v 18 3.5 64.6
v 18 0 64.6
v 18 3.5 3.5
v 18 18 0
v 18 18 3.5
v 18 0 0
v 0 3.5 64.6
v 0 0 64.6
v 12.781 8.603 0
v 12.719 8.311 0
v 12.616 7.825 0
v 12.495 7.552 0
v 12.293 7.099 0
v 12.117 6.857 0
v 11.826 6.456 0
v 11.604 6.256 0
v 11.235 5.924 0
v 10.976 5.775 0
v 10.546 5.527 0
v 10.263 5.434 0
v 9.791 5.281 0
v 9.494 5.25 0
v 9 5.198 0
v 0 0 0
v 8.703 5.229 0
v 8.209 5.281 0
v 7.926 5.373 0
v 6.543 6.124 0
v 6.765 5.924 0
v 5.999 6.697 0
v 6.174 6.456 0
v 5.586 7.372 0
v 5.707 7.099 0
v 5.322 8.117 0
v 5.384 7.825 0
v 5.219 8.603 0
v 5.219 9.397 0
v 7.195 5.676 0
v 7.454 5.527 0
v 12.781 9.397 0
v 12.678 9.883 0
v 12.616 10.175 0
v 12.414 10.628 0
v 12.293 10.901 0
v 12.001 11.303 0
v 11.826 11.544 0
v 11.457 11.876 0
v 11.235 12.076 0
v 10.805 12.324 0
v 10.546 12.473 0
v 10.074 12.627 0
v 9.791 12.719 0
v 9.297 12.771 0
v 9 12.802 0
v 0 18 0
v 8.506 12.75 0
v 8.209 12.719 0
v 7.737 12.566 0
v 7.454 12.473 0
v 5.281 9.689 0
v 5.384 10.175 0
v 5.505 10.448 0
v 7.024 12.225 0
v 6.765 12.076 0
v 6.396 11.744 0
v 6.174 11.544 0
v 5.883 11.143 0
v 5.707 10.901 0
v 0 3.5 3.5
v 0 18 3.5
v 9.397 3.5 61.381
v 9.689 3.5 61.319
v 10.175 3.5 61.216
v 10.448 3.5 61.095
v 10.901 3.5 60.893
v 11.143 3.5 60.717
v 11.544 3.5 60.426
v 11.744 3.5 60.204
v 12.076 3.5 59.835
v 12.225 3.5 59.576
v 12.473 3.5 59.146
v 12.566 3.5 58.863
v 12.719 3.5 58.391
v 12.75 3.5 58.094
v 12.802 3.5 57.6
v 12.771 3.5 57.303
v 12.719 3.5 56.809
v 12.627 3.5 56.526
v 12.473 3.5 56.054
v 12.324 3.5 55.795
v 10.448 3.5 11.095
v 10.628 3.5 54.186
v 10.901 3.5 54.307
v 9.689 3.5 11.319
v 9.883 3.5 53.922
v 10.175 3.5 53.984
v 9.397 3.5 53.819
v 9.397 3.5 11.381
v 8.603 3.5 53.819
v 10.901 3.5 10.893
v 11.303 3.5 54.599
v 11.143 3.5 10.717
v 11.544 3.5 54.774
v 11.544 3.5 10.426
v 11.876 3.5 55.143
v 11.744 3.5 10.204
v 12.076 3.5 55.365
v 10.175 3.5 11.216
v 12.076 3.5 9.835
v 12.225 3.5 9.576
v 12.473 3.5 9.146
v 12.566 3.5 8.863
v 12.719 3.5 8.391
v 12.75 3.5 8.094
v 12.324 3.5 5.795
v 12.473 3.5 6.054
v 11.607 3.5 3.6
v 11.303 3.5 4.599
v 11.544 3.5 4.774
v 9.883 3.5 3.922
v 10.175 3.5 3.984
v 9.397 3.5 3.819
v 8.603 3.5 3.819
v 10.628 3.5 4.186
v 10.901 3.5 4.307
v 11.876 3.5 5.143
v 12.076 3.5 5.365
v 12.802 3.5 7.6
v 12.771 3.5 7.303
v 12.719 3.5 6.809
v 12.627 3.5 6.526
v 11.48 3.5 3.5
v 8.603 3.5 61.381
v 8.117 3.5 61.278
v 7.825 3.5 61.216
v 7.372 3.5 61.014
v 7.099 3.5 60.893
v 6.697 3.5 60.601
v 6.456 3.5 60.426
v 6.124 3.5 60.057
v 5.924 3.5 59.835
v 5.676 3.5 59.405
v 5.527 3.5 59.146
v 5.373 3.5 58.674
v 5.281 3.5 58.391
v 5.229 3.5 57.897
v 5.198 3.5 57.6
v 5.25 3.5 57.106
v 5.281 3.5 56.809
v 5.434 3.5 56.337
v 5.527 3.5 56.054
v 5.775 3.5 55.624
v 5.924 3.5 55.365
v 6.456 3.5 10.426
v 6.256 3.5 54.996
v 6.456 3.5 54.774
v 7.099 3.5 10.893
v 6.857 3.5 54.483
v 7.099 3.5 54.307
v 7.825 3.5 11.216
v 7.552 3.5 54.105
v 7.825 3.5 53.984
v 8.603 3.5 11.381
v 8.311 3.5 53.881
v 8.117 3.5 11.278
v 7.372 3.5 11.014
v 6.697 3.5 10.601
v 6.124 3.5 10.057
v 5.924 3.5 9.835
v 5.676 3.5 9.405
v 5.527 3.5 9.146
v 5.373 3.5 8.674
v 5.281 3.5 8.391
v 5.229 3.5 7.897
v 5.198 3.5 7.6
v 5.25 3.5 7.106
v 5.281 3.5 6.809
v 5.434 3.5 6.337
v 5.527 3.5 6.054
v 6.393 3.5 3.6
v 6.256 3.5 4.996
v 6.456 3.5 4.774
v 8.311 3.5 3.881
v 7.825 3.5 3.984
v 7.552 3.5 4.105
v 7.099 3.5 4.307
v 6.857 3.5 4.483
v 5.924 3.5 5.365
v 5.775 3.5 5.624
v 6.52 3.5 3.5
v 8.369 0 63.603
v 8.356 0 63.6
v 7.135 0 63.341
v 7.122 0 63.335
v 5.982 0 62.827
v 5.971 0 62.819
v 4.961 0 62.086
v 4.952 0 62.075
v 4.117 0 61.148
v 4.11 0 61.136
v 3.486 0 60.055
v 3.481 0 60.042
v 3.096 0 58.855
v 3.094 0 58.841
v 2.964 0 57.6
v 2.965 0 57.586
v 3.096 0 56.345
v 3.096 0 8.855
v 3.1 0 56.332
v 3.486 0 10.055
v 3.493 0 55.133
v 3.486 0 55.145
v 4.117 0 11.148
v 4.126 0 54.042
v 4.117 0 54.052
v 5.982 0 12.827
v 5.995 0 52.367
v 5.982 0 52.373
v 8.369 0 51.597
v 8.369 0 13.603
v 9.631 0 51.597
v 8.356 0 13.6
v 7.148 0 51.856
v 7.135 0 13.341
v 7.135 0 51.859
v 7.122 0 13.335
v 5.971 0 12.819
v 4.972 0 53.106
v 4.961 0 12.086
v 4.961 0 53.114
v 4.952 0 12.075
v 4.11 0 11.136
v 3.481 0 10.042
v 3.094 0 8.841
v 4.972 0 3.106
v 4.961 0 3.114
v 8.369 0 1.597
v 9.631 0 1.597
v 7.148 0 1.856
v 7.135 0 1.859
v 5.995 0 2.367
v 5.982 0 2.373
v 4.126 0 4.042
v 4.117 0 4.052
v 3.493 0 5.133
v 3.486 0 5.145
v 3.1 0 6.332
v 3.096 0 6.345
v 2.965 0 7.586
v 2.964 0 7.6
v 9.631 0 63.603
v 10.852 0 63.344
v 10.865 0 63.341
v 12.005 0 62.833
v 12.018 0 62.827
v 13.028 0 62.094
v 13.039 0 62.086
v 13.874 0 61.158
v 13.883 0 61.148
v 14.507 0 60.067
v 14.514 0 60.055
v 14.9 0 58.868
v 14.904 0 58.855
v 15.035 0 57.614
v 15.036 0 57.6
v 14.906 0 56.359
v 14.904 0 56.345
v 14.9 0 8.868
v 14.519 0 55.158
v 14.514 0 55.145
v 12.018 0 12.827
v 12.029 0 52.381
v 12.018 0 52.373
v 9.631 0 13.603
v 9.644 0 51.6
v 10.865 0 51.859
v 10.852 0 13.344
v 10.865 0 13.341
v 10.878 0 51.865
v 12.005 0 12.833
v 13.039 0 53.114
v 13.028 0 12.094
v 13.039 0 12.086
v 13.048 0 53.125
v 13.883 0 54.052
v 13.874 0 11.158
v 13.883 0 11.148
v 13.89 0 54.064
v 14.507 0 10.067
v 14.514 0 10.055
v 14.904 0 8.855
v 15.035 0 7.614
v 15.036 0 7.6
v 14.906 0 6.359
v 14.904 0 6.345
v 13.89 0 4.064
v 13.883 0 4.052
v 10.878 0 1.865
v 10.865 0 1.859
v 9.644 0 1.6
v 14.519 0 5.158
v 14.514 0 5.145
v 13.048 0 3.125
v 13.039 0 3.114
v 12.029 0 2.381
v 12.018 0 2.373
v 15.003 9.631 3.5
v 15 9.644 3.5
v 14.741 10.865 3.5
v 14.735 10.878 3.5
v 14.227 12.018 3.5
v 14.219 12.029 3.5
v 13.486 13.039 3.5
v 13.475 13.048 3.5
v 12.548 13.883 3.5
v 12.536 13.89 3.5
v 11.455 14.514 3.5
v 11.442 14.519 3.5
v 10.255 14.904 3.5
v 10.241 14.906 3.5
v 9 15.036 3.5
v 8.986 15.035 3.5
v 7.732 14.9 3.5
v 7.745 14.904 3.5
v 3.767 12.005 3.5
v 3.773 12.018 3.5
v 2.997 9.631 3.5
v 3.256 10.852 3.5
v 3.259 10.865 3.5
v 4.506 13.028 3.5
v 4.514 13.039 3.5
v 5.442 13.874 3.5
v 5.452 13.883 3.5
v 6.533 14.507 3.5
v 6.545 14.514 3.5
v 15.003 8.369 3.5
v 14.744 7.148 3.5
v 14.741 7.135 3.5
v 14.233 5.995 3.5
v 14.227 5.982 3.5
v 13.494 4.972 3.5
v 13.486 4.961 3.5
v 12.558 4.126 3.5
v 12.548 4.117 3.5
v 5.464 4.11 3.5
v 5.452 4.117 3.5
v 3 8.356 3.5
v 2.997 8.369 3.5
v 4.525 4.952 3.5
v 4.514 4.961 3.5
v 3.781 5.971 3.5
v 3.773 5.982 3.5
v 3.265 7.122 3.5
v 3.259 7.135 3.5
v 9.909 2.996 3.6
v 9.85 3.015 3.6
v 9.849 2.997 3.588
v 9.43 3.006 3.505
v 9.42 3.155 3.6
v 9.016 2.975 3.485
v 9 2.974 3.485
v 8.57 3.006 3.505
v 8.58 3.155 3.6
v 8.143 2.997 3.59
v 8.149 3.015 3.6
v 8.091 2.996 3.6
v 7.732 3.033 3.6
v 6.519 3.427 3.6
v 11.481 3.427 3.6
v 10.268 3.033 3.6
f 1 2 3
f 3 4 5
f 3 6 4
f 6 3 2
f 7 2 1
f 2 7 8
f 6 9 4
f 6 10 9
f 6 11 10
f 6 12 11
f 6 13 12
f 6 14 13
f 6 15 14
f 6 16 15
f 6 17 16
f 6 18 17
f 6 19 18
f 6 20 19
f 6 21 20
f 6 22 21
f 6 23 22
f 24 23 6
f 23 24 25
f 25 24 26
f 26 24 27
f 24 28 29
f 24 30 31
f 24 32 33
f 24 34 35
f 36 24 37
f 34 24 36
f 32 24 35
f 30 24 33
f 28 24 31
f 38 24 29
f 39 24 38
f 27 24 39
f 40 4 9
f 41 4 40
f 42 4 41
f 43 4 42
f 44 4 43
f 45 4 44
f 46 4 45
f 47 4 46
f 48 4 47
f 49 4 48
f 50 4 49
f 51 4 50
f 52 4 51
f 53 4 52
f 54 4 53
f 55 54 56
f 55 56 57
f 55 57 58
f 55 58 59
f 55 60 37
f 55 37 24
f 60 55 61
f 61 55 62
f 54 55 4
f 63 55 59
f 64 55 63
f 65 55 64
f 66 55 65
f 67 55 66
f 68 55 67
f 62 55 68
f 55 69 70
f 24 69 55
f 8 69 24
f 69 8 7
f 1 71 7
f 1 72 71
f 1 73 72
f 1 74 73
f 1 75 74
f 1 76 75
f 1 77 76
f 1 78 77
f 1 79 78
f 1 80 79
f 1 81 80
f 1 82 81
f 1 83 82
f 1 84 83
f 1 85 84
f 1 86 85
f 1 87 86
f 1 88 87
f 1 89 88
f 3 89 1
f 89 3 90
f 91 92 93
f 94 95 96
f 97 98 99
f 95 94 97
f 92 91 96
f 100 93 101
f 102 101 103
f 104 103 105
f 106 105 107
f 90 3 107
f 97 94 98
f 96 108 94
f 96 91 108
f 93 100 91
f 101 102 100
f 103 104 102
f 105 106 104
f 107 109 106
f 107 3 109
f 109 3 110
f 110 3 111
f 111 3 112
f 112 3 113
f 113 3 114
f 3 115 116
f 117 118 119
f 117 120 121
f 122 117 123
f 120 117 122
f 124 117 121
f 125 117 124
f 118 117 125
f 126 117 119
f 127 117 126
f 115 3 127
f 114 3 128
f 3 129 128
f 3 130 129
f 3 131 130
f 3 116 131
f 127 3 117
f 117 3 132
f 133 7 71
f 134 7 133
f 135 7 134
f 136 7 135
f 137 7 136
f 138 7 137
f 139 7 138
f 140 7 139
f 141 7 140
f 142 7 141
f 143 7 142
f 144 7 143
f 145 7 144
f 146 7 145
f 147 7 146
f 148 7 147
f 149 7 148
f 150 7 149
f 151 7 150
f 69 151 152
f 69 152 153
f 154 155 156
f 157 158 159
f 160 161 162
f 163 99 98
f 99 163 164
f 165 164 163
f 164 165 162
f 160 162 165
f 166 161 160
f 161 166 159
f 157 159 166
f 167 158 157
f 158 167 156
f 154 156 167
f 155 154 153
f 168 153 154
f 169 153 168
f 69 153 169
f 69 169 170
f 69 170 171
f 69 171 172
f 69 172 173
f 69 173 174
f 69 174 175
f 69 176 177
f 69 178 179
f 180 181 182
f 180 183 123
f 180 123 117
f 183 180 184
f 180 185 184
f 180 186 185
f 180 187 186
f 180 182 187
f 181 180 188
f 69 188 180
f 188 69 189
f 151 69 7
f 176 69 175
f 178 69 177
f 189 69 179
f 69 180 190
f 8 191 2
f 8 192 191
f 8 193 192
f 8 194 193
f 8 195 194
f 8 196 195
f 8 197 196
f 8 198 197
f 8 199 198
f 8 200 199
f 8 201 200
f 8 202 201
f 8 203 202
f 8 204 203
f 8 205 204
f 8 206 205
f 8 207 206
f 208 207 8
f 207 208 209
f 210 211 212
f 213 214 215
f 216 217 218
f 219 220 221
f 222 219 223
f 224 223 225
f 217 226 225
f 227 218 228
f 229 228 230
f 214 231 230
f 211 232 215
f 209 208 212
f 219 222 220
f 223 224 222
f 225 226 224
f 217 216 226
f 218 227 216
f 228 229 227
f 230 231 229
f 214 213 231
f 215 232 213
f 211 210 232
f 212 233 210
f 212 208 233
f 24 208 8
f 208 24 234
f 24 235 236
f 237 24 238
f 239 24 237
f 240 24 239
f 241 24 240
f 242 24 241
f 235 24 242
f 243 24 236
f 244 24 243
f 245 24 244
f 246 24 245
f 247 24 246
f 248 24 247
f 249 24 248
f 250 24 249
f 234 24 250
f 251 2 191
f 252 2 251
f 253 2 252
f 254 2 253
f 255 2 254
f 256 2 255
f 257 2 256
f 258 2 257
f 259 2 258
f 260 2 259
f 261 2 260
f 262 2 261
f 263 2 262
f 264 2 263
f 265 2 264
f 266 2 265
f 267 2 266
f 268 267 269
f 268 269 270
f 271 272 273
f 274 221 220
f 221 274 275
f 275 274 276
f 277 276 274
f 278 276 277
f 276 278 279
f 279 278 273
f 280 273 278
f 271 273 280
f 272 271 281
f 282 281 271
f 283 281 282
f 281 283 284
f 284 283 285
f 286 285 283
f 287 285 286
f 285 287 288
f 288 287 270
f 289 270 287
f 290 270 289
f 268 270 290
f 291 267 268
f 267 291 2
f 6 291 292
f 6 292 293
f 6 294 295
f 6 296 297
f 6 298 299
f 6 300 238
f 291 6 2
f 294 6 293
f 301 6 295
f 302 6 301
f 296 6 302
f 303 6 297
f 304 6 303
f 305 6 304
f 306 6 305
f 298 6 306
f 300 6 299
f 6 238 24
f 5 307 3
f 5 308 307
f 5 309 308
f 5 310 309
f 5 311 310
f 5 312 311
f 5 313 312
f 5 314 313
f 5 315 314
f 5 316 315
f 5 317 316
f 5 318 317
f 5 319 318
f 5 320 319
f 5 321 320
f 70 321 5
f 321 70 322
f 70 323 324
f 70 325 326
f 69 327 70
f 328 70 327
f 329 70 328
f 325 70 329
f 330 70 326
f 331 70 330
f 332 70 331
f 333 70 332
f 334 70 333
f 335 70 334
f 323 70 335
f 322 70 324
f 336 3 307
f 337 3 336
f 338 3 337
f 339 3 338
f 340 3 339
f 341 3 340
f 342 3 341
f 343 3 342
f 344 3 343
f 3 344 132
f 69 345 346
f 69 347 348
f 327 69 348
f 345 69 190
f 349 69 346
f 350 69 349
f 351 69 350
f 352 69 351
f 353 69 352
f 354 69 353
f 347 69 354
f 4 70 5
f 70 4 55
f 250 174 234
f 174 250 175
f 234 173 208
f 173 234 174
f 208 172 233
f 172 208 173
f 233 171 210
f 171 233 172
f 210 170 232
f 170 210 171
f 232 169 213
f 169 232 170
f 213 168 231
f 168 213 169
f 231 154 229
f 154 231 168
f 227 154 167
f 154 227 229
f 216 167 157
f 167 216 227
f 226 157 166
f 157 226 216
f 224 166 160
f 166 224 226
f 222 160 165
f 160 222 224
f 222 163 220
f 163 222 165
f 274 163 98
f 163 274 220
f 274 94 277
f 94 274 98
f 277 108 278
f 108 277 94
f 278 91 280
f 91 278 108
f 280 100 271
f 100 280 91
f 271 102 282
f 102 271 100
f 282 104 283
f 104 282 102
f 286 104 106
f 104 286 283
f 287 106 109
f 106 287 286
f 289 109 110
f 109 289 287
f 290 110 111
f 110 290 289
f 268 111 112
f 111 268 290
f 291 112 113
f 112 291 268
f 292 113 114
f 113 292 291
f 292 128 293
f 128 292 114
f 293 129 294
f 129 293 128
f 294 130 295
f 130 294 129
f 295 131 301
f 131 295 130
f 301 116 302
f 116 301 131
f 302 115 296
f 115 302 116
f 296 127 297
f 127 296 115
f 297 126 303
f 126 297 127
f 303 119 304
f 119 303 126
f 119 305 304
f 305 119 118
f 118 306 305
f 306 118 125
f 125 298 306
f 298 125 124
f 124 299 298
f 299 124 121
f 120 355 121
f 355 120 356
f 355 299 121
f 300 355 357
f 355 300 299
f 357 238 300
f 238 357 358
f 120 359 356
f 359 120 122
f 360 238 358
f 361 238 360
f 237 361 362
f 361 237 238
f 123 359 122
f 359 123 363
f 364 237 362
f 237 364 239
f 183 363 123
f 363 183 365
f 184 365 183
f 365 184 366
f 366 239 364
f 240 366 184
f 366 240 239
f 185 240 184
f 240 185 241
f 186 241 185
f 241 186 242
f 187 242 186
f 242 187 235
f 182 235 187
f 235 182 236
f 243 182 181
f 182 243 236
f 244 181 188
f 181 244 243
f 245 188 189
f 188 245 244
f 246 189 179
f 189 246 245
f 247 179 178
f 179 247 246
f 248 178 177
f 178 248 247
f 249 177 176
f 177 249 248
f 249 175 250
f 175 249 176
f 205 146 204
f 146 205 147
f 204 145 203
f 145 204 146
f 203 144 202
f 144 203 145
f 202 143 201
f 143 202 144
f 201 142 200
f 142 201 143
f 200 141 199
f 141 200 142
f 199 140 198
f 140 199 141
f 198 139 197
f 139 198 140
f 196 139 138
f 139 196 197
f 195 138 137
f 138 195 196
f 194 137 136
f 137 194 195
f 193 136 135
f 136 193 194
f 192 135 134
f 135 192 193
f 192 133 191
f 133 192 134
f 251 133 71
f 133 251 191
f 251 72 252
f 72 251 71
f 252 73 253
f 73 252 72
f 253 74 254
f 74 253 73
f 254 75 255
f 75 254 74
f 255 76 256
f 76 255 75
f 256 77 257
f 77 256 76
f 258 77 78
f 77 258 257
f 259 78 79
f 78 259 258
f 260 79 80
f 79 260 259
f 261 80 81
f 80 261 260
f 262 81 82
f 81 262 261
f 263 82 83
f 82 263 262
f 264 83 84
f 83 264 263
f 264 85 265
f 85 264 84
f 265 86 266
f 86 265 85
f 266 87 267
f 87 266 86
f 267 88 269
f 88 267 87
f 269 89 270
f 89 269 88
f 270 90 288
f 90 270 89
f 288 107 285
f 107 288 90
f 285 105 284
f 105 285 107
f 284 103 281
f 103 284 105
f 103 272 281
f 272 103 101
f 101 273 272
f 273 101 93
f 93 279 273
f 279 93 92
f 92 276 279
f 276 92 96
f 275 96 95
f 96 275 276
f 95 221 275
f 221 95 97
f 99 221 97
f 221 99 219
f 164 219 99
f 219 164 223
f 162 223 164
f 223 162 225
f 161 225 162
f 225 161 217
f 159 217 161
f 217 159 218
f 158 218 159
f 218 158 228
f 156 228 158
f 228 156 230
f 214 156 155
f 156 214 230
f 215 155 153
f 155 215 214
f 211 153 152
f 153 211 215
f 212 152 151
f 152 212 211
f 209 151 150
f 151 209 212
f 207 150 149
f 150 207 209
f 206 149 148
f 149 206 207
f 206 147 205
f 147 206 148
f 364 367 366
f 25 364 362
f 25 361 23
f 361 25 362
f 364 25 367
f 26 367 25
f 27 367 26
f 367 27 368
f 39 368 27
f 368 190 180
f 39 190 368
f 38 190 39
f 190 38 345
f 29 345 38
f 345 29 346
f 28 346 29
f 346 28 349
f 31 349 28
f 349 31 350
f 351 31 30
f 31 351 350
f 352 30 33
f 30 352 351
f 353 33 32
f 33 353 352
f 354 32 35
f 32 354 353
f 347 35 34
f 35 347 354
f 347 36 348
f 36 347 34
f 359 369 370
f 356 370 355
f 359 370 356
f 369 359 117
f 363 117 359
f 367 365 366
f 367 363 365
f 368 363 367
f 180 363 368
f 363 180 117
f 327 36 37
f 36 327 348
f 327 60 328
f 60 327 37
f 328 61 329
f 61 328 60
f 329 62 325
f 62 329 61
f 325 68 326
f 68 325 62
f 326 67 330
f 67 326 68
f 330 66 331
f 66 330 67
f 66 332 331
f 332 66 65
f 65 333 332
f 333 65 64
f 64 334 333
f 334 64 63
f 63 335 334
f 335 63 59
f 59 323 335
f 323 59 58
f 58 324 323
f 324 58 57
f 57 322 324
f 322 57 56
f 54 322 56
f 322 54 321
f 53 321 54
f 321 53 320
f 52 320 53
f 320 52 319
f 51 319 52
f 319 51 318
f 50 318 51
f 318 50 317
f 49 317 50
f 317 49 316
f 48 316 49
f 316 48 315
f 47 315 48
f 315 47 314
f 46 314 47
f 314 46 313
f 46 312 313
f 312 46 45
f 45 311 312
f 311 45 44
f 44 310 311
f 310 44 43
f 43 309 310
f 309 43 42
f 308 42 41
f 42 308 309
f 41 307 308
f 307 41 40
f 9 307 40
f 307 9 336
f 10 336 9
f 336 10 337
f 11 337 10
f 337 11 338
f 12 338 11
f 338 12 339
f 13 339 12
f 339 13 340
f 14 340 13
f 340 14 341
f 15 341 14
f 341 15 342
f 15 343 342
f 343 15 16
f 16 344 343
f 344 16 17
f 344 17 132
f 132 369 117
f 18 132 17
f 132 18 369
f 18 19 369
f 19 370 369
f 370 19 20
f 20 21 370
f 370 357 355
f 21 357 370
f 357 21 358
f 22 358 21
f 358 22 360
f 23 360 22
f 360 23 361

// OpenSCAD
// file: Parts/Screw.scad
// created by IndiePandaaaaa | Lukas

function cone_diameter(diameter) = diameter * 2;

function cone_height(diameter) = diameter * 0.75;

module screw(diameter, length, cutout_sample = false, fs = 0.1, fa = 1) {
    //$fs = 0.1; [size in mm] | $fa = 1; [degrees]
    //$fn = 100; [defined faces]

    module base_model(diameter, length, cone_height, cone_diameter, offset = 0, fs = 0.1, fa = 1) {
        rotate_extrude($fs = fs) {
            polygon([
                    [0, 0],
                    [(diameter + offset) / 2, 0],
                    [(diameter + offset) / 2, (length + offset) - (cone_height + offset)],
                    [(cone_diameter + offset) / 2, length + offset],
                    [0, length + offset],
                ]);
        }
    }

    if (length < diameter) {
        echo("Screw is too short");
        length = diameter + 1;
        echo("New length is: ", length);
    }

    if (!cutout_sample) {
        translate([0, 0, - length])
            difference() {
                base_model(diameter, length, cone_height(diameter), cone_diameter(diameter));

                // top cross part
                translate([0, 0, length + 0.1 - (cone_height(diameter) - diameter / 2)])
                    difference() {
                        rotate([0, 0, 45])
                            rotate_extrude($fn = 4) {
                                polygon([
                                        [0, 0],
                                        [diameter * 1.4 / 2, 0],
                                        [cone_diameter(diameter) / 2, cone_height(diameter) - diameter / 2],
                                        [0, cone_height(diameter) - diameter / 2],
                                    ]);
                            }
                        for (i = [0 : 1 : 3]) {
                            rotate([0, 0, 90 * i])
                                translate([diameter / 3.18 / 2, diameter / 3.18 / 2, - 0.1])
                                    cube(cone_height(diameter) + 0.2);
                        }
                    }
            }
    } else {
        offset = 0.2;
        translate([0, 0, - length - offset / 2])
            base_model(diameter, length, cone_height(diameter), cone_diameter(diameter), offset);
    }
}

screw(3.5, 12);
// main file
// created by IndiePandaaaaa | Lukas

use <Parts/Screw.scad>

MODEL_TOLERANCE = 0.1;
MODEL_THICKNESS = 3.5;
FN = 42;

SOCKET_WIDTH = 18;
PLATE_DEPTH = 61;  // Bremounta 58mm
PLATE_SCREW_OD = 6;

BREMOUNTA_SCREW_DIST = 50;
BREMOUNTA_SCREW_OD = 6;
BREMOUNTA_SCREW_HOLE_ID = 6.5;
BREMOUNTA_SCREW_HOLE_OD = BREMOUNTA_SCREW_HOLE_ID + 1;
BREMOUNTA_SCREW_HOLE_OD_DEPTH = 1;

WOOD_SCREWIN_THICKNESS = 18;

difference() {
    union() {
        cube([SOCKET_WIDTH, MODEL_THICKNESS, PLATE_DEPTH + MODEL_TOLERANCE + MODEL_THICKNESS]);
        cube([SOCKET_WIDTH, WOOD_SCREWIN_THICKNESS, MODEL_THICKNESS]);
    }
    translate([SOCKET_WIDTH / 2, WOOD_SCREWIN_THICKNESS / 2, MODEL_THICKNESS])
        rotate([0, 0, 90]) screw(PLATE_SCREW_OD, 12, true);

    for (i = [0:1]) {
        translate([SOCKET_WIDTH / 2, 0, BREMOUNTA_SCREW_OD * 1.25 + MODEL_TOLERANCE + BREMOUNTA_SCREW_DIST * i]) {
            rotate([90, 0, 0]) {
                screw(BREMOUNTA_SCREW_OD, 12, true);
                translate([0, 0, - MODEL_THICKNESS])
                    cylinder(d = BREMOUNTA_SCREW_HOLE_OD, h = BREMOUNTA_SCREW_HOLE_OD_DEPTH, $fn = FN);
            }
        }
    }
}
